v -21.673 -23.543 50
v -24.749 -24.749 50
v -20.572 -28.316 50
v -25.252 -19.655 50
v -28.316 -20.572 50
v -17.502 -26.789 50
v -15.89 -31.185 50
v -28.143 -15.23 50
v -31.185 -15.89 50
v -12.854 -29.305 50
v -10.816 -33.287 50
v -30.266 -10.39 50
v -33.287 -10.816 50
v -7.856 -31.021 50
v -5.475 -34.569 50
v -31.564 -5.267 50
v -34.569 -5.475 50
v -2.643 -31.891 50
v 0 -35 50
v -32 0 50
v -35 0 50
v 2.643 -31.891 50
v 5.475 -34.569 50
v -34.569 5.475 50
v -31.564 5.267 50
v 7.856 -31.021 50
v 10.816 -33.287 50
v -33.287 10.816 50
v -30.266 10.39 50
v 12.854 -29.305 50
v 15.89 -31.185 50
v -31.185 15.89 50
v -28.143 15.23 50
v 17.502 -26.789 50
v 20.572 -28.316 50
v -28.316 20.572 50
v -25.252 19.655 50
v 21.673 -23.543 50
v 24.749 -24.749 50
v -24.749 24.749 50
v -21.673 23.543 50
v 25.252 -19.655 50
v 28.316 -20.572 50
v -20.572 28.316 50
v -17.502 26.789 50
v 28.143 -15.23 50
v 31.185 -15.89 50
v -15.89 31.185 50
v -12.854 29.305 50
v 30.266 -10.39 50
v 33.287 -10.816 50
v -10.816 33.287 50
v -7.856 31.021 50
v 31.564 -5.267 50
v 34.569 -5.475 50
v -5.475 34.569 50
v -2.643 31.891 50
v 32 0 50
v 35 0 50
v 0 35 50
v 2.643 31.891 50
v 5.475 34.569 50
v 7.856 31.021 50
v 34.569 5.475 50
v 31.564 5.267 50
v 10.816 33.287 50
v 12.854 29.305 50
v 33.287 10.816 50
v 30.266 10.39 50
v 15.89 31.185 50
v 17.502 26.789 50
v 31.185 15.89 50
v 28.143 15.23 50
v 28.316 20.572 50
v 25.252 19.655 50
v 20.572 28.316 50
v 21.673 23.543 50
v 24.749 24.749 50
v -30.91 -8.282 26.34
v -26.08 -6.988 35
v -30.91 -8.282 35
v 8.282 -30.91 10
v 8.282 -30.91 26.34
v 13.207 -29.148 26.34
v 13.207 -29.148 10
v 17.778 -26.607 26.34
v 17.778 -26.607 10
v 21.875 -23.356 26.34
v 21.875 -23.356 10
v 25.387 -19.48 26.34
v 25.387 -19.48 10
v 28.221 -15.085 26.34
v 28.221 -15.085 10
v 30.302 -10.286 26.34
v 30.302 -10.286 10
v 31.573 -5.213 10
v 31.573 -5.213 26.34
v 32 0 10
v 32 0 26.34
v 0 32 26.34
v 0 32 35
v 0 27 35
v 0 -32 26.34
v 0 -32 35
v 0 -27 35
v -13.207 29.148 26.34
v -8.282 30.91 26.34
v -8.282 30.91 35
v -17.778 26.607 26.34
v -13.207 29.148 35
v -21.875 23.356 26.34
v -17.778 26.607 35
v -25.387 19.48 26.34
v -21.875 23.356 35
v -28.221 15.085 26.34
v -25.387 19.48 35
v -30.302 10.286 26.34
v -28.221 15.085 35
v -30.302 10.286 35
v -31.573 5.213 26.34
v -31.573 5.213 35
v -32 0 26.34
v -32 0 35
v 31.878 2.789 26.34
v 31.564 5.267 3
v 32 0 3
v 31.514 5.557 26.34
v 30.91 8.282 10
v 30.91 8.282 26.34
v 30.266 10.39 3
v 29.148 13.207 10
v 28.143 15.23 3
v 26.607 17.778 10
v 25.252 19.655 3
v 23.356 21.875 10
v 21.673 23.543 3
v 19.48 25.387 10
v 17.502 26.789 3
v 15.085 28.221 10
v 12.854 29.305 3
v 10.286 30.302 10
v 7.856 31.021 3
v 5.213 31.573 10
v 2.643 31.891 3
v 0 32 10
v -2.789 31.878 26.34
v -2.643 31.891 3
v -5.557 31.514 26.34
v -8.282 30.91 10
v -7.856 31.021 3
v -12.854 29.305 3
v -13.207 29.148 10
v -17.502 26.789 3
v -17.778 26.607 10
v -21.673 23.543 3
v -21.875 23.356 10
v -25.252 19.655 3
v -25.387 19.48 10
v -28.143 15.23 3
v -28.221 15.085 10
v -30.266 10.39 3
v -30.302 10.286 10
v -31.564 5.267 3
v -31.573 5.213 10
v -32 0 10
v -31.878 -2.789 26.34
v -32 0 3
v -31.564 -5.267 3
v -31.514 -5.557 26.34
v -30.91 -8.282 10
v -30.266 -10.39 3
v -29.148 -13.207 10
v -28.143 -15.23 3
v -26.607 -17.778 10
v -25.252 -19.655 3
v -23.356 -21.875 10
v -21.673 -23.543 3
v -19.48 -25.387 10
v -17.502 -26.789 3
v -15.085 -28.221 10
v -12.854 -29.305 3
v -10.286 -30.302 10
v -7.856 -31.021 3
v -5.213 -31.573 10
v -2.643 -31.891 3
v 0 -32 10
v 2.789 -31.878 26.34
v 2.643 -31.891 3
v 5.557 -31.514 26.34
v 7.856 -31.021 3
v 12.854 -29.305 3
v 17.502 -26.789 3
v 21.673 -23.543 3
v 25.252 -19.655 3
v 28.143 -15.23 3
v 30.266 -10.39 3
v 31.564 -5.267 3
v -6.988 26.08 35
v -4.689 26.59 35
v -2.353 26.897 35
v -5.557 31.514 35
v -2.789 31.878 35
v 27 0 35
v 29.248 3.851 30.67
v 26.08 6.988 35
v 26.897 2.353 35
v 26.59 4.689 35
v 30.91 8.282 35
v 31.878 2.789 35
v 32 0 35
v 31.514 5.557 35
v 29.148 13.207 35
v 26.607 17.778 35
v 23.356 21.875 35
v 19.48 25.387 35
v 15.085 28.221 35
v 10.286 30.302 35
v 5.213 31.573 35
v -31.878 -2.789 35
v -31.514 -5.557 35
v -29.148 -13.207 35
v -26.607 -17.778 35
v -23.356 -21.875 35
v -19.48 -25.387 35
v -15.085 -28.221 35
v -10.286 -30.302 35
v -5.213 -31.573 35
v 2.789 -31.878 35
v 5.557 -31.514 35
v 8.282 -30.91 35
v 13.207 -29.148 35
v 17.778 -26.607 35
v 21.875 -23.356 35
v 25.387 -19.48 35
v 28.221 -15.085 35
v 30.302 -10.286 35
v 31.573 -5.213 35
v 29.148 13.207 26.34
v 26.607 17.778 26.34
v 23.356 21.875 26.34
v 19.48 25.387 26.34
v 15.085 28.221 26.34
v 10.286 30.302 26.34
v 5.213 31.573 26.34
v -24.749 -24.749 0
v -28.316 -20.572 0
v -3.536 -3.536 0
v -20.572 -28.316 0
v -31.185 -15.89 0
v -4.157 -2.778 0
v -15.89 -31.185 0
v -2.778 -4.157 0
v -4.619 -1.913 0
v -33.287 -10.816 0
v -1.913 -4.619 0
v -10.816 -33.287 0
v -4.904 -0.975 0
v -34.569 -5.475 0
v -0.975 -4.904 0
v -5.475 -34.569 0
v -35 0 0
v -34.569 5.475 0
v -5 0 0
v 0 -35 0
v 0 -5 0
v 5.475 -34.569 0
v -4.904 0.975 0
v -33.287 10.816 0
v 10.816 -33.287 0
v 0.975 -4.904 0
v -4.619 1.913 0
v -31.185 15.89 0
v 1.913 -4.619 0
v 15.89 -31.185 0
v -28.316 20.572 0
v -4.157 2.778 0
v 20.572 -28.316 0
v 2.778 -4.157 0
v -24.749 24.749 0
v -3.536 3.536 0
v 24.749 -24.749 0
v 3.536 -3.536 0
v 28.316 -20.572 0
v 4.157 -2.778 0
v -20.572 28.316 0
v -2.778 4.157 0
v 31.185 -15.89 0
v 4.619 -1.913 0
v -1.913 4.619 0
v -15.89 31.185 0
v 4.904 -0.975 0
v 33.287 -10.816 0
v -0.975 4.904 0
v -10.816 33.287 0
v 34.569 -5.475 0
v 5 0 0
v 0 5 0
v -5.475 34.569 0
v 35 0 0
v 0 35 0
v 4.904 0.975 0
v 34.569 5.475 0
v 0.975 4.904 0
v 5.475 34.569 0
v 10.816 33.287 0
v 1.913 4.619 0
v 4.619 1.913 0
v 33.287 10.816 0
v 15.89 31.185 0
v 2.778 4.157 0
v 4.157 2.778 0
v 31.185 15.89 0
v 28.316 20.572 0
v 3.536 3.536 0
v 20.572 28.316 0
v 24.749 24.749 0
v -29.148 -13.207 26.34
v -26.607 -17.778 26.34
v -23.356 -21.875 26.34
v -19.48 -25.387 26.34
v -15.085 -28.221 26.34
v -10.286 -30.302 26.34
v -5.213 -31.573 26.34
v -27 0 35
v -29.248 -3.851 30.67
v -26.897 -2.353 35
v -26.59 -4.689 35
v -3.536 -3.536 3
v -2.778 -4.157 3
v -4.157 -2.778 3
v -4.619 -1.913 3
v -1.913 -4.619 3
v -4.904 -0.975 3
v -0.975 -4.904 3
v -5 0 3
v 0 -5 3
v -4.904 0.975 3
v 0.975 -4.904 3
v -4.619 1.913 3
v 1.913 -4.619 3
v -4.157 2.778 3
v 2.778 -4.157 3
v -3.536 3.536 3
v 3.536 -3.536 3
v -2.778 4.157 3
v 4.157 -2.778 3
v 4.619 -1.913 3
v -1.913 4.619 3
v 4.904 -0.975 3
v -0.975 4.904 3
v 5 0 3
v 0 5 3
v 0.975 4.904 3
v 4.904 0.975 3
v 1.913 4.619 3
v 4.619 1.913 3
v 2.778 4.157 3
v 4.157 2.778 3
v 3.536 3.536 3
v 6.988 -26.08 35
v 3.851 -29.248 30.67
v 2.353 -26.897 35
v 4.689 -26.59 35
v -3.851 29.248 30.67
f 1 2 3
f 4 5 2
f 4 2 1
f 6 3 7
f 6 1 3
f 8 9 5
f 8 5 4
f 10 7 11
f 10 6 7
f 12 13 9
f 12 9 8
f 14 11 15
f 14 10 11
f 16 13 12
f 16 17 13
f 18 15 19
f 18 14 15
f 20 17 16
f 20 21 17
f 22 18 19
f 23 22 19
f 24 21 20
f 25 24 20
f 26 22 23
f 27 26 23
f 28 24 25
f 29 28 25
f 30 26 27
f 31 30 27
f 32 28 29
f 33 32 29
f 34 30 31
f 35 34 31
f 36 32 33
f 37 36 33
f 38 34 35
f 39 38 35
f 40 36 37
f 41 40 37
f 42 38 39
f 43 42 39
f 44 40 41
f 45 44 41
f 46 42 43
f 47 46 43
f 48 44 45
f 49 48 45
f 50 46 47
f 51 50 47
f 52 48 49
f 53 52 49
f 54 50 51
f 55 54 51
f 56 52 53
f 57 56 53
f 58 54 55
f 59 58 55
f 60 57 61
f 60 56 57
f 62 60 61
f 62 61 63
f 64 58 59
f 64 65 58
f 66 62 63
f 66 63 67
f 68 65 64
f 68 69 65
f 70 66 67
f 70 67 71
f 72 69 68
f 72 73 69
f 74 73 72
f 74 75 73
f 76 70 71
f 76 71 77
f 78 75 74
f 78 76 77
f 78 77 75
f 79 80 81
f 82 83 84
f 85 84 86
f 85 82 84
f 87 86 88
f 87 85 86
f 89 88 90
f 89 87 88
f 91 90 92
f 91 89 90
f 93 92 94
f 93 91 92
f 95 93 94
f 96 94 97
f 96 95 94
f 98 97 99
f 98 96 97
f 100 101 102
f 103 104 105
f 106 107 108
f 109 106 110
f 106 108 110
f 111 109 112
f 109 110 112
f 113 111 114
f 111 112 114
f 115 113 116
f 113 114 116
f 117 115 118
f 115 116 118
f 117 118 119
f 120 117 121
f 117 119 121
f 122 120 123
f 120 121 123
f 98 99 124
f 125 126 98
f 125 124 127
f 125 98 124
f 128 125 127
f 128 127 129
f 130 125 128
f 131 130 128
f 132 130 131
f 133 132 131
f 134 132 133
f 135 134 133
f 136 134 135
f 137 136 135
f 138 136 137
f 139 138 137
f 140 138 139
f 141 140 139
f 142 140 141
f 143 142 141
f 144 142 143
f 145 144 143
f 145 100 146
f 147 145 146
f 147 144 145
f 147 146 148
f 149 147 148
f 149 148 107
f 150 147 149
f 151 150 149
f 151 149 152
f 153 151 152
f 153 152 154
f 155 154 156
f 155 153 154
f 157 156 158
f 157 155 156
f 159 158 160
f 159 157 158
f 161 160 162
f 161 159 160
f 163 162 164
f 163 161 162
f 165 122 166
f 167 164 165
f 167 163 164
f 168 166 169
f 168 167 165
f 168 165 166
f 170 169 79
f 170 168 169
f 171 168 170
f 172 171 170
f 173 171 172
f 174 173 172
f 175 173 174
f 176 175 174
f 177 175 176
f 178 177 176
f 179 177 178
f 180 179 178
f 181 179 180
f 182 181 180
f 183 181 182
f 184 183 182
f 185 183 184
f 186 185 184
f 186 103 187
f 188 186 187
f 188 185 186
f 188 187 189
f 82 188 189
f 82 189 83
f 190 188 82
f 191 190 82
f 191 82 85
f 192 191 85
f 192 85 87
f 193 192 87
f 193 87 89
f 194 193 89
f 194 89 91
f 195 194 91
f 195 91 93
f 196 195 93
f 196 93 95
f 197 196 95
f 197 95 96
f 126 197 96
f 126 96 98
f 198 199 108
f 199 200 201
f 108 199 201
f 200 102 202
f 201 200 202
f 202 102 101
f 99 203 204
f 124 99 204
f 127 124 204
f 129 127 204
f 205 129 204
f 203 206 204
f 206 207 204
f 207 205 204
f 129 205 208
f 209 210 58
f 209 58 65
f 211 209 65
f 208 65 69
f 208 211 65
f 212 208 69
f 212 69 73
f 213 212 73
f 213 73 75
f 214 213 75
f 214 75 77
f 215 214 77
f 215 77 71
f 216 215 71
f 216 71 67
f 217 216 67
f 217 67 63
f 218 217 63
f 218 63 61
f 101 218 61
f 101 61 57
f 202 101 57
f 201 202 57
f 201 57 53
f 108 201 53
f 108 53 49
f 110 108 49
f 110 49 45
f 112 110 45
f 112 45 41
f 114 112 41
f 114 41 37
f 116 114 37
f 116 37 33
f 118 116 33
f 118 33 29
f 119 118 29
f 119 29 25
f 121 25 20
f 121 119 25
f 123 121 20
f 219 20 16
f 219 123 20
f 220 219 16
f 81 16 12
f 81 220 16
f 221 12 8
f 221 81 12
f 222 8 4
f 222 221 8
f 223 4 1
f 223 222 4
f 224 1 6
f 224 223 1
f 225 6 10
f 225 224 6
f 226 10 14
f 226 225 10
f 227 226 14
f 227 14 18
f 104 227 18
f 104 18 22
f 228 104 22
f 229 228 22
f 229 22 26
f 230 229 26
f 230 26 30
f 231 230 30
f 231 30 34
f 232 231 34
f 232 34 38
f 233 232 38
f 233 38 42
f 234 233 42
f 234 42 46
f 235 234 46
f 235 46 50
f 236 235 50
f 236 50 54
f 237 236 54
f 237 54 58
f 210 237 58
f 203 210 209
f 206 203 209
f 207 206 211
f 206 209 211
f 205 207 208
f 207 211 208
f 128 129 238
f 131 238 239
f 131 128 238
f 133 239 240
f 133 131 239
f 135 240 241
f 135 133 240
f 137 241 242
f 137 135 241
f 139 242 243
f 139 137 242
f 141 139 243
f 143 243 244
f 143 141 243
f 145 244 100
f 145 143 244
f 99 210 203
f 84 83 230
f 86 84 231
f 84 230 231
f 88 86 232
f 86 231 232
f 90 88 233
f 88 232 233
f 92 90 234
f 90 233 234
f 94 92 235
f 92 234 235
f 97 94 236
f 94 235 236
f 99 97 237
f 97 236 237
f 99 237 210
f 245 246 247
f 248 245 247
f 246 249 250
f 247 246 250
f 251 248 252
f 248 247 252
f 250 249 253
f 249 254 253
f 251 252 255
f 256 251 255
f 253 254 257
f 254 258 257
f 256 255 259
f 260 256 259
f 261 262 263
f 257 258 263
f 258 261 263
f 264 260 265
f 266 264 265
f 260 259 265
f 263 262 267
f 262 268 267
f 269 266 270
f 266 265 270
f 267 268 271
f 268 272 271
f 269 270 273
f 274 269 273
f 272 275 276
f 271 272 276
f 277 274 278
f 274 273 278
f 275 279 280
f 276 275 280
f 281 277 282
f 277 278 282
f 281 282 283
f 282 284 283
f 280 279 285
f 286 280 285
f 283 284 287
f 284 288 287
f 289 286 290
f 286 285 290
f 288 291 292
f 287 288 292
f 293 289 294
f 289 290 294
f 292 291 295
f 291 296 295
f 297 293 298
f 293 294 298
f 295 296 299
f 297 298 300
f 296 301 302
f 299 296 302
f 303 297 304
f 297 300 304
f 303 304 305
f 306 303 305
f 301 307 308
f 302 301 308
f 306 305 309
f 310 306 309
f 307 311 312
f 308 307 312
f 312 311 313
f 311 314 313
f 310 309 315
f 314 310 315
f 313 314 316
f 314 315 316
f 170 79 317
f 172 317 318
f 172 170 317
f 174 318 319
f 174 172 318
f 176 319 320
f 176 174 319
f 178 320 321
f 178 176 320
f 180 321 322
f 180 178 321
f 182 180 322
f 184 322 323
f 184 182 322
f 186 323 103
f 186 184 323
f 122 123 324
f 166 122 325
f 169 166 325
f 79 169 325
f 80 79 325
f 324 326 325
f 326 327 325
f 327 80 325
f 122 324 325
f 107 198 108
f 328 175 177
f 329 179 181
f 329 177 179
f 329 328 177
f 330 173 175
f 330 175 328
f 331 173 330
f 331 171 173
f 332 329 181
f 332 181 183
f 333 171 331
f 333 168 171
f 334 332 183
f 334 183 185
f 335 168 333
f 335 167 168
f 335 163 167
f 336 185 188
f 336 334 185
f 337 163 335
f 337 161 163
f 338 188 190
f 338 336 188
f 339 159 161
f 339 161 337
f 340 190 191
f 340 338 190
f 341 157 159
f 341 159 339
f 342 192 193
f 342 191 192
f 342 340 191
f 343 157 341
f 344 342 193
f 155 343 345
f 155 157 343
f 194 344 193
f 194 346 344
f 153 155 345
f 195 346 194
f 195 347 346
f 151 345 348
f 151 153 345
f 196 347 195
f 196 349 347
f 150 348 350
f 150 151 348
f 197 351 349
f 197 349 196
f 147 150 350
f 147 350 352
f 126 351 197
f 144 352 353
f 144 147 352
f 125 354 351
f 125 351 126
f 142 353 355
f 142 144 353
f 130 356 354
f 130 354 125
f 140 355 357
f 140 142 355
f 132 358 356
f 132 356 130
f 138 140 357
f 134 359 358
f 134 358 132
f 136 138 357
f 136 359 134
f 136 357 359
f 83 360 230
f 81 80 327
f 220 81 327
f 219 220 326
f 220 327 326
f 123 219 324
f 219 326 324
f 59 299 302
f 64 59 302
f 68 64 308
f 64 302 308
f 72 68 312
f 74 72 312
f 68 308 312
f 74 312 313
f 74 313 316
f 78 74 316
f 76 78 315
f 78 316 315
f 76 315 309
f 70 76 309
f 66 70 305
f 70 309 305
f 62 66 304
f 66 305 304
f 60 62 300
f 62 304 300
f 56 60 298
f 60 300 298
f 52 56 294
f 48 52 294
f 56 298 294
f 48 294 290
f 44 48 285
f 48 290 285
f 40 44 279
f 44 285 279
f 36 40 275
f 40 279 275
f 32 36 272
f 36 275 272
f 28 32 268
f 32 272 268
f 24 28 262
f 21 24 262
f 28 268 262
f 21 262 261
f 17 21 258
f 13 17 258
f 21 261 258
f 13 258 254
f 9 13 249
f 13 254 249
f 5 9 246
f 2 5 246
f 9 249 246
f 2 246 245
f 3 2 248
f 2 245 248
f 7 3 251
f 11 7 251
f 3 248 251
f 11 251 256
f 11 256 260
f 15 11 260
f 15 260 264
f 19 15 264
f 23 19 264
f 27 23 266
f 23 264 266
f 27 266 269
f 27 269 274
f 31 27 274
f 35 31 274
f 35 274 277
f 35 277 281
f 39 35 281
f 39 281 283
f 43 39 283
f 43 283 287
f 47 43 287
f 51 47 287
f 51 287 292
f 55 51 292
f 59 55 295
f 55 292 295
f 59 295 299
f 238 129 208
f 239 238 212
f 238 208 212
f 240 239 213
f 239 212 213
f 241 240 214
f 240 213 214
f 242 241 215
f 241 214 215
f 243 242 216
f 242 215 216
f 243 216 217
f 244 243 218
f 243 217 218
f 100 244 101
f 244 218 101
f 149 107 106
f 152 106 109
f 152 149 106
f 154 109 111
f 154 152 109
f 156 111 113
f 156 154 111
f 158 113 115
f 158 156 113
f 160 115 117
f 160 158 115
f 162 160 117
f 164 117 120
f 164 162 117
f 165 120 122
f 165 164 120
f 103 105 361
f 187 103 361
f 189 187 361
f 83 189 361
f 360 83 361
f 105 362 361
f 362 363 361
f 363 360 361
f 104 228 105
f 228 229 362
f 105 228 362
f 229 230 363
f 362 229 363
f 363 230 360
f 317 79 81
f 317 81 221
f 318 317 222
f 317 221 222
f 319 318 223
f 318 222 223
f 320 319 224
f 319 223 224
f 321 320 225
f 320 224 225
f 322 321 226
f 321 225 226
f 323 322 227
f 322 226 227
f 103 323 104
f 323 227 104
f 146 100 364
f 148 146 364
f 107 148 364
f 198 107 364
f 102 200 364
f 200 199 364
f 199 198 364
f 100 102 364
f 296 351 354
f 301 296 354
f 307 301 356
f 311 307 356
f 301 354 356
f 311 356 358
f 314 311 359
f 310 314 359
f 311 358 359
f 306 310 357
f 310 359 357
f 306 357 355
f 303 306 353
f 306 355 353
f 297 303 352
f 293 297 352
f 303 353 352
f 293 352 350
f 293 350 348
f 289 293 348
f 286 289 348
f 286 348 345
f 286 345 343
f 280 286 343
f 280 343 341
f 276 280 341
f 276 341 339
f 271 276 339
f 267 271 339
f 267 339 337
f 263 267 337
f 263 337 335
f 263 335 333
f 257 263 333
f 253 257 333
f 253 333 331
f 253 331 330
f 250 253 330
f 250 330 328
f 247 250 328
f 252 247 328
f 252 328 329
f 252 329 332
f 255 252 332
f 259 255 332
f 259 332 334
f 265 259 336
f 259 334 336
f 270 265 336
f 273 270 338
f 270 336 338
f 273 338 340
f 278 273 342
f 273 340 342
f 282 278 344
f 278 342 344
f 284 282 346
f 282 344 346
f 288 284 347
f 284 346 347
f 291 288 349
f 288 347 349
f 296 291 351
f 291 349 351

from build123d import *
from build123d import SkipClean  # not in build123d's __all__

# Parameters (mm, degrees)
F0_R     = 35
F1_DEPTH = 50
F2_T     = -3
F6_DEPTH = 25
F7_R     = 5
F8_DEPTH = 25


# Not quite as in the source:
# - after a boolean that leaves OpenCascade's solid faulty, fix() repairs it


with BuildPart() as f1:
    # F0 (on Top) → F1 (new body)
    with BuildSketch(Plane.XY):
        Circle(F0_R)
    extrude(amount=F1_DEPTH)

    # F2
    f2_openings = [f1.faces().sort_by_distance(p)[0] for p in [
        (0, 0, 50),
    ]]
    offset(amount=F2_T, openings=f2_openings)

    # F3 (on Right) → F4 (revolve)
    with BuildSketch(Plane.YZ):
        Polygon((-27, 35), (-32, 35), (-32, 26.3397459622), align=None)
    revolve(axis=Axis((0, 0, 50.3253415227), (0, 0, 1)))

    # F5 (on face) → F6 (cut)
    with BuildSketch(Plane.XY.offset(35)):
        with BuildLine():
            ThreePointArc((-8.2822094433, 30.9096264413), (-25.3873068893, 19.4803657283), (-32, 0))
            Line((-32, 0), (0, 0))
            Line((0, 0), (-8.2822094433, 30.9096264413))
        make_face()
        with BuildLine():
            Line((0, 32), (0, 0))
            Line((0, 0), (30.9096264413, 8.2822094433))
            ThreePointArc((30.9096264413, 8.2822094433), (19.4803657283, 25.3873068893), (0, 32))
        make_face()
        with BuildLine():
            Line((32, 0), (0, 0))
            Line((0, 0), (8.2822094433, -30.9096264413))
            ThreePointArc((8.2822094433, -30.9096264413), (25.3873068893, -19.4803657283), (32, 0))
        make_face()
        with BuildLine():
            Line((0, -32), (0, 0))
            Line((0, 0), (-30.9096264413, -8.2822094433))
            ThreePointArc((-30.9096264413, -8.2822094433), (-19.4803657283, -25.3873068893), (0, -32))
        make_face()
    with SkipClean():  # cleaning this boolean's faces spoils the solid; the shape is the same uncleaned
        extrude(amount=-F6_DEPTH, mode=Mode.SUBTRACT)

    # F7 (on face) → F8 (cut)
    with BuildSketch(Plane.XY.offset(3)):
        Circle(F7_R)
    extrude(amount=-F8_DEPTH, mode=Mode.SUBTRACT)

    add(f1.part.fix(), mode=Mode.REPLACE)


solid = f1.part
